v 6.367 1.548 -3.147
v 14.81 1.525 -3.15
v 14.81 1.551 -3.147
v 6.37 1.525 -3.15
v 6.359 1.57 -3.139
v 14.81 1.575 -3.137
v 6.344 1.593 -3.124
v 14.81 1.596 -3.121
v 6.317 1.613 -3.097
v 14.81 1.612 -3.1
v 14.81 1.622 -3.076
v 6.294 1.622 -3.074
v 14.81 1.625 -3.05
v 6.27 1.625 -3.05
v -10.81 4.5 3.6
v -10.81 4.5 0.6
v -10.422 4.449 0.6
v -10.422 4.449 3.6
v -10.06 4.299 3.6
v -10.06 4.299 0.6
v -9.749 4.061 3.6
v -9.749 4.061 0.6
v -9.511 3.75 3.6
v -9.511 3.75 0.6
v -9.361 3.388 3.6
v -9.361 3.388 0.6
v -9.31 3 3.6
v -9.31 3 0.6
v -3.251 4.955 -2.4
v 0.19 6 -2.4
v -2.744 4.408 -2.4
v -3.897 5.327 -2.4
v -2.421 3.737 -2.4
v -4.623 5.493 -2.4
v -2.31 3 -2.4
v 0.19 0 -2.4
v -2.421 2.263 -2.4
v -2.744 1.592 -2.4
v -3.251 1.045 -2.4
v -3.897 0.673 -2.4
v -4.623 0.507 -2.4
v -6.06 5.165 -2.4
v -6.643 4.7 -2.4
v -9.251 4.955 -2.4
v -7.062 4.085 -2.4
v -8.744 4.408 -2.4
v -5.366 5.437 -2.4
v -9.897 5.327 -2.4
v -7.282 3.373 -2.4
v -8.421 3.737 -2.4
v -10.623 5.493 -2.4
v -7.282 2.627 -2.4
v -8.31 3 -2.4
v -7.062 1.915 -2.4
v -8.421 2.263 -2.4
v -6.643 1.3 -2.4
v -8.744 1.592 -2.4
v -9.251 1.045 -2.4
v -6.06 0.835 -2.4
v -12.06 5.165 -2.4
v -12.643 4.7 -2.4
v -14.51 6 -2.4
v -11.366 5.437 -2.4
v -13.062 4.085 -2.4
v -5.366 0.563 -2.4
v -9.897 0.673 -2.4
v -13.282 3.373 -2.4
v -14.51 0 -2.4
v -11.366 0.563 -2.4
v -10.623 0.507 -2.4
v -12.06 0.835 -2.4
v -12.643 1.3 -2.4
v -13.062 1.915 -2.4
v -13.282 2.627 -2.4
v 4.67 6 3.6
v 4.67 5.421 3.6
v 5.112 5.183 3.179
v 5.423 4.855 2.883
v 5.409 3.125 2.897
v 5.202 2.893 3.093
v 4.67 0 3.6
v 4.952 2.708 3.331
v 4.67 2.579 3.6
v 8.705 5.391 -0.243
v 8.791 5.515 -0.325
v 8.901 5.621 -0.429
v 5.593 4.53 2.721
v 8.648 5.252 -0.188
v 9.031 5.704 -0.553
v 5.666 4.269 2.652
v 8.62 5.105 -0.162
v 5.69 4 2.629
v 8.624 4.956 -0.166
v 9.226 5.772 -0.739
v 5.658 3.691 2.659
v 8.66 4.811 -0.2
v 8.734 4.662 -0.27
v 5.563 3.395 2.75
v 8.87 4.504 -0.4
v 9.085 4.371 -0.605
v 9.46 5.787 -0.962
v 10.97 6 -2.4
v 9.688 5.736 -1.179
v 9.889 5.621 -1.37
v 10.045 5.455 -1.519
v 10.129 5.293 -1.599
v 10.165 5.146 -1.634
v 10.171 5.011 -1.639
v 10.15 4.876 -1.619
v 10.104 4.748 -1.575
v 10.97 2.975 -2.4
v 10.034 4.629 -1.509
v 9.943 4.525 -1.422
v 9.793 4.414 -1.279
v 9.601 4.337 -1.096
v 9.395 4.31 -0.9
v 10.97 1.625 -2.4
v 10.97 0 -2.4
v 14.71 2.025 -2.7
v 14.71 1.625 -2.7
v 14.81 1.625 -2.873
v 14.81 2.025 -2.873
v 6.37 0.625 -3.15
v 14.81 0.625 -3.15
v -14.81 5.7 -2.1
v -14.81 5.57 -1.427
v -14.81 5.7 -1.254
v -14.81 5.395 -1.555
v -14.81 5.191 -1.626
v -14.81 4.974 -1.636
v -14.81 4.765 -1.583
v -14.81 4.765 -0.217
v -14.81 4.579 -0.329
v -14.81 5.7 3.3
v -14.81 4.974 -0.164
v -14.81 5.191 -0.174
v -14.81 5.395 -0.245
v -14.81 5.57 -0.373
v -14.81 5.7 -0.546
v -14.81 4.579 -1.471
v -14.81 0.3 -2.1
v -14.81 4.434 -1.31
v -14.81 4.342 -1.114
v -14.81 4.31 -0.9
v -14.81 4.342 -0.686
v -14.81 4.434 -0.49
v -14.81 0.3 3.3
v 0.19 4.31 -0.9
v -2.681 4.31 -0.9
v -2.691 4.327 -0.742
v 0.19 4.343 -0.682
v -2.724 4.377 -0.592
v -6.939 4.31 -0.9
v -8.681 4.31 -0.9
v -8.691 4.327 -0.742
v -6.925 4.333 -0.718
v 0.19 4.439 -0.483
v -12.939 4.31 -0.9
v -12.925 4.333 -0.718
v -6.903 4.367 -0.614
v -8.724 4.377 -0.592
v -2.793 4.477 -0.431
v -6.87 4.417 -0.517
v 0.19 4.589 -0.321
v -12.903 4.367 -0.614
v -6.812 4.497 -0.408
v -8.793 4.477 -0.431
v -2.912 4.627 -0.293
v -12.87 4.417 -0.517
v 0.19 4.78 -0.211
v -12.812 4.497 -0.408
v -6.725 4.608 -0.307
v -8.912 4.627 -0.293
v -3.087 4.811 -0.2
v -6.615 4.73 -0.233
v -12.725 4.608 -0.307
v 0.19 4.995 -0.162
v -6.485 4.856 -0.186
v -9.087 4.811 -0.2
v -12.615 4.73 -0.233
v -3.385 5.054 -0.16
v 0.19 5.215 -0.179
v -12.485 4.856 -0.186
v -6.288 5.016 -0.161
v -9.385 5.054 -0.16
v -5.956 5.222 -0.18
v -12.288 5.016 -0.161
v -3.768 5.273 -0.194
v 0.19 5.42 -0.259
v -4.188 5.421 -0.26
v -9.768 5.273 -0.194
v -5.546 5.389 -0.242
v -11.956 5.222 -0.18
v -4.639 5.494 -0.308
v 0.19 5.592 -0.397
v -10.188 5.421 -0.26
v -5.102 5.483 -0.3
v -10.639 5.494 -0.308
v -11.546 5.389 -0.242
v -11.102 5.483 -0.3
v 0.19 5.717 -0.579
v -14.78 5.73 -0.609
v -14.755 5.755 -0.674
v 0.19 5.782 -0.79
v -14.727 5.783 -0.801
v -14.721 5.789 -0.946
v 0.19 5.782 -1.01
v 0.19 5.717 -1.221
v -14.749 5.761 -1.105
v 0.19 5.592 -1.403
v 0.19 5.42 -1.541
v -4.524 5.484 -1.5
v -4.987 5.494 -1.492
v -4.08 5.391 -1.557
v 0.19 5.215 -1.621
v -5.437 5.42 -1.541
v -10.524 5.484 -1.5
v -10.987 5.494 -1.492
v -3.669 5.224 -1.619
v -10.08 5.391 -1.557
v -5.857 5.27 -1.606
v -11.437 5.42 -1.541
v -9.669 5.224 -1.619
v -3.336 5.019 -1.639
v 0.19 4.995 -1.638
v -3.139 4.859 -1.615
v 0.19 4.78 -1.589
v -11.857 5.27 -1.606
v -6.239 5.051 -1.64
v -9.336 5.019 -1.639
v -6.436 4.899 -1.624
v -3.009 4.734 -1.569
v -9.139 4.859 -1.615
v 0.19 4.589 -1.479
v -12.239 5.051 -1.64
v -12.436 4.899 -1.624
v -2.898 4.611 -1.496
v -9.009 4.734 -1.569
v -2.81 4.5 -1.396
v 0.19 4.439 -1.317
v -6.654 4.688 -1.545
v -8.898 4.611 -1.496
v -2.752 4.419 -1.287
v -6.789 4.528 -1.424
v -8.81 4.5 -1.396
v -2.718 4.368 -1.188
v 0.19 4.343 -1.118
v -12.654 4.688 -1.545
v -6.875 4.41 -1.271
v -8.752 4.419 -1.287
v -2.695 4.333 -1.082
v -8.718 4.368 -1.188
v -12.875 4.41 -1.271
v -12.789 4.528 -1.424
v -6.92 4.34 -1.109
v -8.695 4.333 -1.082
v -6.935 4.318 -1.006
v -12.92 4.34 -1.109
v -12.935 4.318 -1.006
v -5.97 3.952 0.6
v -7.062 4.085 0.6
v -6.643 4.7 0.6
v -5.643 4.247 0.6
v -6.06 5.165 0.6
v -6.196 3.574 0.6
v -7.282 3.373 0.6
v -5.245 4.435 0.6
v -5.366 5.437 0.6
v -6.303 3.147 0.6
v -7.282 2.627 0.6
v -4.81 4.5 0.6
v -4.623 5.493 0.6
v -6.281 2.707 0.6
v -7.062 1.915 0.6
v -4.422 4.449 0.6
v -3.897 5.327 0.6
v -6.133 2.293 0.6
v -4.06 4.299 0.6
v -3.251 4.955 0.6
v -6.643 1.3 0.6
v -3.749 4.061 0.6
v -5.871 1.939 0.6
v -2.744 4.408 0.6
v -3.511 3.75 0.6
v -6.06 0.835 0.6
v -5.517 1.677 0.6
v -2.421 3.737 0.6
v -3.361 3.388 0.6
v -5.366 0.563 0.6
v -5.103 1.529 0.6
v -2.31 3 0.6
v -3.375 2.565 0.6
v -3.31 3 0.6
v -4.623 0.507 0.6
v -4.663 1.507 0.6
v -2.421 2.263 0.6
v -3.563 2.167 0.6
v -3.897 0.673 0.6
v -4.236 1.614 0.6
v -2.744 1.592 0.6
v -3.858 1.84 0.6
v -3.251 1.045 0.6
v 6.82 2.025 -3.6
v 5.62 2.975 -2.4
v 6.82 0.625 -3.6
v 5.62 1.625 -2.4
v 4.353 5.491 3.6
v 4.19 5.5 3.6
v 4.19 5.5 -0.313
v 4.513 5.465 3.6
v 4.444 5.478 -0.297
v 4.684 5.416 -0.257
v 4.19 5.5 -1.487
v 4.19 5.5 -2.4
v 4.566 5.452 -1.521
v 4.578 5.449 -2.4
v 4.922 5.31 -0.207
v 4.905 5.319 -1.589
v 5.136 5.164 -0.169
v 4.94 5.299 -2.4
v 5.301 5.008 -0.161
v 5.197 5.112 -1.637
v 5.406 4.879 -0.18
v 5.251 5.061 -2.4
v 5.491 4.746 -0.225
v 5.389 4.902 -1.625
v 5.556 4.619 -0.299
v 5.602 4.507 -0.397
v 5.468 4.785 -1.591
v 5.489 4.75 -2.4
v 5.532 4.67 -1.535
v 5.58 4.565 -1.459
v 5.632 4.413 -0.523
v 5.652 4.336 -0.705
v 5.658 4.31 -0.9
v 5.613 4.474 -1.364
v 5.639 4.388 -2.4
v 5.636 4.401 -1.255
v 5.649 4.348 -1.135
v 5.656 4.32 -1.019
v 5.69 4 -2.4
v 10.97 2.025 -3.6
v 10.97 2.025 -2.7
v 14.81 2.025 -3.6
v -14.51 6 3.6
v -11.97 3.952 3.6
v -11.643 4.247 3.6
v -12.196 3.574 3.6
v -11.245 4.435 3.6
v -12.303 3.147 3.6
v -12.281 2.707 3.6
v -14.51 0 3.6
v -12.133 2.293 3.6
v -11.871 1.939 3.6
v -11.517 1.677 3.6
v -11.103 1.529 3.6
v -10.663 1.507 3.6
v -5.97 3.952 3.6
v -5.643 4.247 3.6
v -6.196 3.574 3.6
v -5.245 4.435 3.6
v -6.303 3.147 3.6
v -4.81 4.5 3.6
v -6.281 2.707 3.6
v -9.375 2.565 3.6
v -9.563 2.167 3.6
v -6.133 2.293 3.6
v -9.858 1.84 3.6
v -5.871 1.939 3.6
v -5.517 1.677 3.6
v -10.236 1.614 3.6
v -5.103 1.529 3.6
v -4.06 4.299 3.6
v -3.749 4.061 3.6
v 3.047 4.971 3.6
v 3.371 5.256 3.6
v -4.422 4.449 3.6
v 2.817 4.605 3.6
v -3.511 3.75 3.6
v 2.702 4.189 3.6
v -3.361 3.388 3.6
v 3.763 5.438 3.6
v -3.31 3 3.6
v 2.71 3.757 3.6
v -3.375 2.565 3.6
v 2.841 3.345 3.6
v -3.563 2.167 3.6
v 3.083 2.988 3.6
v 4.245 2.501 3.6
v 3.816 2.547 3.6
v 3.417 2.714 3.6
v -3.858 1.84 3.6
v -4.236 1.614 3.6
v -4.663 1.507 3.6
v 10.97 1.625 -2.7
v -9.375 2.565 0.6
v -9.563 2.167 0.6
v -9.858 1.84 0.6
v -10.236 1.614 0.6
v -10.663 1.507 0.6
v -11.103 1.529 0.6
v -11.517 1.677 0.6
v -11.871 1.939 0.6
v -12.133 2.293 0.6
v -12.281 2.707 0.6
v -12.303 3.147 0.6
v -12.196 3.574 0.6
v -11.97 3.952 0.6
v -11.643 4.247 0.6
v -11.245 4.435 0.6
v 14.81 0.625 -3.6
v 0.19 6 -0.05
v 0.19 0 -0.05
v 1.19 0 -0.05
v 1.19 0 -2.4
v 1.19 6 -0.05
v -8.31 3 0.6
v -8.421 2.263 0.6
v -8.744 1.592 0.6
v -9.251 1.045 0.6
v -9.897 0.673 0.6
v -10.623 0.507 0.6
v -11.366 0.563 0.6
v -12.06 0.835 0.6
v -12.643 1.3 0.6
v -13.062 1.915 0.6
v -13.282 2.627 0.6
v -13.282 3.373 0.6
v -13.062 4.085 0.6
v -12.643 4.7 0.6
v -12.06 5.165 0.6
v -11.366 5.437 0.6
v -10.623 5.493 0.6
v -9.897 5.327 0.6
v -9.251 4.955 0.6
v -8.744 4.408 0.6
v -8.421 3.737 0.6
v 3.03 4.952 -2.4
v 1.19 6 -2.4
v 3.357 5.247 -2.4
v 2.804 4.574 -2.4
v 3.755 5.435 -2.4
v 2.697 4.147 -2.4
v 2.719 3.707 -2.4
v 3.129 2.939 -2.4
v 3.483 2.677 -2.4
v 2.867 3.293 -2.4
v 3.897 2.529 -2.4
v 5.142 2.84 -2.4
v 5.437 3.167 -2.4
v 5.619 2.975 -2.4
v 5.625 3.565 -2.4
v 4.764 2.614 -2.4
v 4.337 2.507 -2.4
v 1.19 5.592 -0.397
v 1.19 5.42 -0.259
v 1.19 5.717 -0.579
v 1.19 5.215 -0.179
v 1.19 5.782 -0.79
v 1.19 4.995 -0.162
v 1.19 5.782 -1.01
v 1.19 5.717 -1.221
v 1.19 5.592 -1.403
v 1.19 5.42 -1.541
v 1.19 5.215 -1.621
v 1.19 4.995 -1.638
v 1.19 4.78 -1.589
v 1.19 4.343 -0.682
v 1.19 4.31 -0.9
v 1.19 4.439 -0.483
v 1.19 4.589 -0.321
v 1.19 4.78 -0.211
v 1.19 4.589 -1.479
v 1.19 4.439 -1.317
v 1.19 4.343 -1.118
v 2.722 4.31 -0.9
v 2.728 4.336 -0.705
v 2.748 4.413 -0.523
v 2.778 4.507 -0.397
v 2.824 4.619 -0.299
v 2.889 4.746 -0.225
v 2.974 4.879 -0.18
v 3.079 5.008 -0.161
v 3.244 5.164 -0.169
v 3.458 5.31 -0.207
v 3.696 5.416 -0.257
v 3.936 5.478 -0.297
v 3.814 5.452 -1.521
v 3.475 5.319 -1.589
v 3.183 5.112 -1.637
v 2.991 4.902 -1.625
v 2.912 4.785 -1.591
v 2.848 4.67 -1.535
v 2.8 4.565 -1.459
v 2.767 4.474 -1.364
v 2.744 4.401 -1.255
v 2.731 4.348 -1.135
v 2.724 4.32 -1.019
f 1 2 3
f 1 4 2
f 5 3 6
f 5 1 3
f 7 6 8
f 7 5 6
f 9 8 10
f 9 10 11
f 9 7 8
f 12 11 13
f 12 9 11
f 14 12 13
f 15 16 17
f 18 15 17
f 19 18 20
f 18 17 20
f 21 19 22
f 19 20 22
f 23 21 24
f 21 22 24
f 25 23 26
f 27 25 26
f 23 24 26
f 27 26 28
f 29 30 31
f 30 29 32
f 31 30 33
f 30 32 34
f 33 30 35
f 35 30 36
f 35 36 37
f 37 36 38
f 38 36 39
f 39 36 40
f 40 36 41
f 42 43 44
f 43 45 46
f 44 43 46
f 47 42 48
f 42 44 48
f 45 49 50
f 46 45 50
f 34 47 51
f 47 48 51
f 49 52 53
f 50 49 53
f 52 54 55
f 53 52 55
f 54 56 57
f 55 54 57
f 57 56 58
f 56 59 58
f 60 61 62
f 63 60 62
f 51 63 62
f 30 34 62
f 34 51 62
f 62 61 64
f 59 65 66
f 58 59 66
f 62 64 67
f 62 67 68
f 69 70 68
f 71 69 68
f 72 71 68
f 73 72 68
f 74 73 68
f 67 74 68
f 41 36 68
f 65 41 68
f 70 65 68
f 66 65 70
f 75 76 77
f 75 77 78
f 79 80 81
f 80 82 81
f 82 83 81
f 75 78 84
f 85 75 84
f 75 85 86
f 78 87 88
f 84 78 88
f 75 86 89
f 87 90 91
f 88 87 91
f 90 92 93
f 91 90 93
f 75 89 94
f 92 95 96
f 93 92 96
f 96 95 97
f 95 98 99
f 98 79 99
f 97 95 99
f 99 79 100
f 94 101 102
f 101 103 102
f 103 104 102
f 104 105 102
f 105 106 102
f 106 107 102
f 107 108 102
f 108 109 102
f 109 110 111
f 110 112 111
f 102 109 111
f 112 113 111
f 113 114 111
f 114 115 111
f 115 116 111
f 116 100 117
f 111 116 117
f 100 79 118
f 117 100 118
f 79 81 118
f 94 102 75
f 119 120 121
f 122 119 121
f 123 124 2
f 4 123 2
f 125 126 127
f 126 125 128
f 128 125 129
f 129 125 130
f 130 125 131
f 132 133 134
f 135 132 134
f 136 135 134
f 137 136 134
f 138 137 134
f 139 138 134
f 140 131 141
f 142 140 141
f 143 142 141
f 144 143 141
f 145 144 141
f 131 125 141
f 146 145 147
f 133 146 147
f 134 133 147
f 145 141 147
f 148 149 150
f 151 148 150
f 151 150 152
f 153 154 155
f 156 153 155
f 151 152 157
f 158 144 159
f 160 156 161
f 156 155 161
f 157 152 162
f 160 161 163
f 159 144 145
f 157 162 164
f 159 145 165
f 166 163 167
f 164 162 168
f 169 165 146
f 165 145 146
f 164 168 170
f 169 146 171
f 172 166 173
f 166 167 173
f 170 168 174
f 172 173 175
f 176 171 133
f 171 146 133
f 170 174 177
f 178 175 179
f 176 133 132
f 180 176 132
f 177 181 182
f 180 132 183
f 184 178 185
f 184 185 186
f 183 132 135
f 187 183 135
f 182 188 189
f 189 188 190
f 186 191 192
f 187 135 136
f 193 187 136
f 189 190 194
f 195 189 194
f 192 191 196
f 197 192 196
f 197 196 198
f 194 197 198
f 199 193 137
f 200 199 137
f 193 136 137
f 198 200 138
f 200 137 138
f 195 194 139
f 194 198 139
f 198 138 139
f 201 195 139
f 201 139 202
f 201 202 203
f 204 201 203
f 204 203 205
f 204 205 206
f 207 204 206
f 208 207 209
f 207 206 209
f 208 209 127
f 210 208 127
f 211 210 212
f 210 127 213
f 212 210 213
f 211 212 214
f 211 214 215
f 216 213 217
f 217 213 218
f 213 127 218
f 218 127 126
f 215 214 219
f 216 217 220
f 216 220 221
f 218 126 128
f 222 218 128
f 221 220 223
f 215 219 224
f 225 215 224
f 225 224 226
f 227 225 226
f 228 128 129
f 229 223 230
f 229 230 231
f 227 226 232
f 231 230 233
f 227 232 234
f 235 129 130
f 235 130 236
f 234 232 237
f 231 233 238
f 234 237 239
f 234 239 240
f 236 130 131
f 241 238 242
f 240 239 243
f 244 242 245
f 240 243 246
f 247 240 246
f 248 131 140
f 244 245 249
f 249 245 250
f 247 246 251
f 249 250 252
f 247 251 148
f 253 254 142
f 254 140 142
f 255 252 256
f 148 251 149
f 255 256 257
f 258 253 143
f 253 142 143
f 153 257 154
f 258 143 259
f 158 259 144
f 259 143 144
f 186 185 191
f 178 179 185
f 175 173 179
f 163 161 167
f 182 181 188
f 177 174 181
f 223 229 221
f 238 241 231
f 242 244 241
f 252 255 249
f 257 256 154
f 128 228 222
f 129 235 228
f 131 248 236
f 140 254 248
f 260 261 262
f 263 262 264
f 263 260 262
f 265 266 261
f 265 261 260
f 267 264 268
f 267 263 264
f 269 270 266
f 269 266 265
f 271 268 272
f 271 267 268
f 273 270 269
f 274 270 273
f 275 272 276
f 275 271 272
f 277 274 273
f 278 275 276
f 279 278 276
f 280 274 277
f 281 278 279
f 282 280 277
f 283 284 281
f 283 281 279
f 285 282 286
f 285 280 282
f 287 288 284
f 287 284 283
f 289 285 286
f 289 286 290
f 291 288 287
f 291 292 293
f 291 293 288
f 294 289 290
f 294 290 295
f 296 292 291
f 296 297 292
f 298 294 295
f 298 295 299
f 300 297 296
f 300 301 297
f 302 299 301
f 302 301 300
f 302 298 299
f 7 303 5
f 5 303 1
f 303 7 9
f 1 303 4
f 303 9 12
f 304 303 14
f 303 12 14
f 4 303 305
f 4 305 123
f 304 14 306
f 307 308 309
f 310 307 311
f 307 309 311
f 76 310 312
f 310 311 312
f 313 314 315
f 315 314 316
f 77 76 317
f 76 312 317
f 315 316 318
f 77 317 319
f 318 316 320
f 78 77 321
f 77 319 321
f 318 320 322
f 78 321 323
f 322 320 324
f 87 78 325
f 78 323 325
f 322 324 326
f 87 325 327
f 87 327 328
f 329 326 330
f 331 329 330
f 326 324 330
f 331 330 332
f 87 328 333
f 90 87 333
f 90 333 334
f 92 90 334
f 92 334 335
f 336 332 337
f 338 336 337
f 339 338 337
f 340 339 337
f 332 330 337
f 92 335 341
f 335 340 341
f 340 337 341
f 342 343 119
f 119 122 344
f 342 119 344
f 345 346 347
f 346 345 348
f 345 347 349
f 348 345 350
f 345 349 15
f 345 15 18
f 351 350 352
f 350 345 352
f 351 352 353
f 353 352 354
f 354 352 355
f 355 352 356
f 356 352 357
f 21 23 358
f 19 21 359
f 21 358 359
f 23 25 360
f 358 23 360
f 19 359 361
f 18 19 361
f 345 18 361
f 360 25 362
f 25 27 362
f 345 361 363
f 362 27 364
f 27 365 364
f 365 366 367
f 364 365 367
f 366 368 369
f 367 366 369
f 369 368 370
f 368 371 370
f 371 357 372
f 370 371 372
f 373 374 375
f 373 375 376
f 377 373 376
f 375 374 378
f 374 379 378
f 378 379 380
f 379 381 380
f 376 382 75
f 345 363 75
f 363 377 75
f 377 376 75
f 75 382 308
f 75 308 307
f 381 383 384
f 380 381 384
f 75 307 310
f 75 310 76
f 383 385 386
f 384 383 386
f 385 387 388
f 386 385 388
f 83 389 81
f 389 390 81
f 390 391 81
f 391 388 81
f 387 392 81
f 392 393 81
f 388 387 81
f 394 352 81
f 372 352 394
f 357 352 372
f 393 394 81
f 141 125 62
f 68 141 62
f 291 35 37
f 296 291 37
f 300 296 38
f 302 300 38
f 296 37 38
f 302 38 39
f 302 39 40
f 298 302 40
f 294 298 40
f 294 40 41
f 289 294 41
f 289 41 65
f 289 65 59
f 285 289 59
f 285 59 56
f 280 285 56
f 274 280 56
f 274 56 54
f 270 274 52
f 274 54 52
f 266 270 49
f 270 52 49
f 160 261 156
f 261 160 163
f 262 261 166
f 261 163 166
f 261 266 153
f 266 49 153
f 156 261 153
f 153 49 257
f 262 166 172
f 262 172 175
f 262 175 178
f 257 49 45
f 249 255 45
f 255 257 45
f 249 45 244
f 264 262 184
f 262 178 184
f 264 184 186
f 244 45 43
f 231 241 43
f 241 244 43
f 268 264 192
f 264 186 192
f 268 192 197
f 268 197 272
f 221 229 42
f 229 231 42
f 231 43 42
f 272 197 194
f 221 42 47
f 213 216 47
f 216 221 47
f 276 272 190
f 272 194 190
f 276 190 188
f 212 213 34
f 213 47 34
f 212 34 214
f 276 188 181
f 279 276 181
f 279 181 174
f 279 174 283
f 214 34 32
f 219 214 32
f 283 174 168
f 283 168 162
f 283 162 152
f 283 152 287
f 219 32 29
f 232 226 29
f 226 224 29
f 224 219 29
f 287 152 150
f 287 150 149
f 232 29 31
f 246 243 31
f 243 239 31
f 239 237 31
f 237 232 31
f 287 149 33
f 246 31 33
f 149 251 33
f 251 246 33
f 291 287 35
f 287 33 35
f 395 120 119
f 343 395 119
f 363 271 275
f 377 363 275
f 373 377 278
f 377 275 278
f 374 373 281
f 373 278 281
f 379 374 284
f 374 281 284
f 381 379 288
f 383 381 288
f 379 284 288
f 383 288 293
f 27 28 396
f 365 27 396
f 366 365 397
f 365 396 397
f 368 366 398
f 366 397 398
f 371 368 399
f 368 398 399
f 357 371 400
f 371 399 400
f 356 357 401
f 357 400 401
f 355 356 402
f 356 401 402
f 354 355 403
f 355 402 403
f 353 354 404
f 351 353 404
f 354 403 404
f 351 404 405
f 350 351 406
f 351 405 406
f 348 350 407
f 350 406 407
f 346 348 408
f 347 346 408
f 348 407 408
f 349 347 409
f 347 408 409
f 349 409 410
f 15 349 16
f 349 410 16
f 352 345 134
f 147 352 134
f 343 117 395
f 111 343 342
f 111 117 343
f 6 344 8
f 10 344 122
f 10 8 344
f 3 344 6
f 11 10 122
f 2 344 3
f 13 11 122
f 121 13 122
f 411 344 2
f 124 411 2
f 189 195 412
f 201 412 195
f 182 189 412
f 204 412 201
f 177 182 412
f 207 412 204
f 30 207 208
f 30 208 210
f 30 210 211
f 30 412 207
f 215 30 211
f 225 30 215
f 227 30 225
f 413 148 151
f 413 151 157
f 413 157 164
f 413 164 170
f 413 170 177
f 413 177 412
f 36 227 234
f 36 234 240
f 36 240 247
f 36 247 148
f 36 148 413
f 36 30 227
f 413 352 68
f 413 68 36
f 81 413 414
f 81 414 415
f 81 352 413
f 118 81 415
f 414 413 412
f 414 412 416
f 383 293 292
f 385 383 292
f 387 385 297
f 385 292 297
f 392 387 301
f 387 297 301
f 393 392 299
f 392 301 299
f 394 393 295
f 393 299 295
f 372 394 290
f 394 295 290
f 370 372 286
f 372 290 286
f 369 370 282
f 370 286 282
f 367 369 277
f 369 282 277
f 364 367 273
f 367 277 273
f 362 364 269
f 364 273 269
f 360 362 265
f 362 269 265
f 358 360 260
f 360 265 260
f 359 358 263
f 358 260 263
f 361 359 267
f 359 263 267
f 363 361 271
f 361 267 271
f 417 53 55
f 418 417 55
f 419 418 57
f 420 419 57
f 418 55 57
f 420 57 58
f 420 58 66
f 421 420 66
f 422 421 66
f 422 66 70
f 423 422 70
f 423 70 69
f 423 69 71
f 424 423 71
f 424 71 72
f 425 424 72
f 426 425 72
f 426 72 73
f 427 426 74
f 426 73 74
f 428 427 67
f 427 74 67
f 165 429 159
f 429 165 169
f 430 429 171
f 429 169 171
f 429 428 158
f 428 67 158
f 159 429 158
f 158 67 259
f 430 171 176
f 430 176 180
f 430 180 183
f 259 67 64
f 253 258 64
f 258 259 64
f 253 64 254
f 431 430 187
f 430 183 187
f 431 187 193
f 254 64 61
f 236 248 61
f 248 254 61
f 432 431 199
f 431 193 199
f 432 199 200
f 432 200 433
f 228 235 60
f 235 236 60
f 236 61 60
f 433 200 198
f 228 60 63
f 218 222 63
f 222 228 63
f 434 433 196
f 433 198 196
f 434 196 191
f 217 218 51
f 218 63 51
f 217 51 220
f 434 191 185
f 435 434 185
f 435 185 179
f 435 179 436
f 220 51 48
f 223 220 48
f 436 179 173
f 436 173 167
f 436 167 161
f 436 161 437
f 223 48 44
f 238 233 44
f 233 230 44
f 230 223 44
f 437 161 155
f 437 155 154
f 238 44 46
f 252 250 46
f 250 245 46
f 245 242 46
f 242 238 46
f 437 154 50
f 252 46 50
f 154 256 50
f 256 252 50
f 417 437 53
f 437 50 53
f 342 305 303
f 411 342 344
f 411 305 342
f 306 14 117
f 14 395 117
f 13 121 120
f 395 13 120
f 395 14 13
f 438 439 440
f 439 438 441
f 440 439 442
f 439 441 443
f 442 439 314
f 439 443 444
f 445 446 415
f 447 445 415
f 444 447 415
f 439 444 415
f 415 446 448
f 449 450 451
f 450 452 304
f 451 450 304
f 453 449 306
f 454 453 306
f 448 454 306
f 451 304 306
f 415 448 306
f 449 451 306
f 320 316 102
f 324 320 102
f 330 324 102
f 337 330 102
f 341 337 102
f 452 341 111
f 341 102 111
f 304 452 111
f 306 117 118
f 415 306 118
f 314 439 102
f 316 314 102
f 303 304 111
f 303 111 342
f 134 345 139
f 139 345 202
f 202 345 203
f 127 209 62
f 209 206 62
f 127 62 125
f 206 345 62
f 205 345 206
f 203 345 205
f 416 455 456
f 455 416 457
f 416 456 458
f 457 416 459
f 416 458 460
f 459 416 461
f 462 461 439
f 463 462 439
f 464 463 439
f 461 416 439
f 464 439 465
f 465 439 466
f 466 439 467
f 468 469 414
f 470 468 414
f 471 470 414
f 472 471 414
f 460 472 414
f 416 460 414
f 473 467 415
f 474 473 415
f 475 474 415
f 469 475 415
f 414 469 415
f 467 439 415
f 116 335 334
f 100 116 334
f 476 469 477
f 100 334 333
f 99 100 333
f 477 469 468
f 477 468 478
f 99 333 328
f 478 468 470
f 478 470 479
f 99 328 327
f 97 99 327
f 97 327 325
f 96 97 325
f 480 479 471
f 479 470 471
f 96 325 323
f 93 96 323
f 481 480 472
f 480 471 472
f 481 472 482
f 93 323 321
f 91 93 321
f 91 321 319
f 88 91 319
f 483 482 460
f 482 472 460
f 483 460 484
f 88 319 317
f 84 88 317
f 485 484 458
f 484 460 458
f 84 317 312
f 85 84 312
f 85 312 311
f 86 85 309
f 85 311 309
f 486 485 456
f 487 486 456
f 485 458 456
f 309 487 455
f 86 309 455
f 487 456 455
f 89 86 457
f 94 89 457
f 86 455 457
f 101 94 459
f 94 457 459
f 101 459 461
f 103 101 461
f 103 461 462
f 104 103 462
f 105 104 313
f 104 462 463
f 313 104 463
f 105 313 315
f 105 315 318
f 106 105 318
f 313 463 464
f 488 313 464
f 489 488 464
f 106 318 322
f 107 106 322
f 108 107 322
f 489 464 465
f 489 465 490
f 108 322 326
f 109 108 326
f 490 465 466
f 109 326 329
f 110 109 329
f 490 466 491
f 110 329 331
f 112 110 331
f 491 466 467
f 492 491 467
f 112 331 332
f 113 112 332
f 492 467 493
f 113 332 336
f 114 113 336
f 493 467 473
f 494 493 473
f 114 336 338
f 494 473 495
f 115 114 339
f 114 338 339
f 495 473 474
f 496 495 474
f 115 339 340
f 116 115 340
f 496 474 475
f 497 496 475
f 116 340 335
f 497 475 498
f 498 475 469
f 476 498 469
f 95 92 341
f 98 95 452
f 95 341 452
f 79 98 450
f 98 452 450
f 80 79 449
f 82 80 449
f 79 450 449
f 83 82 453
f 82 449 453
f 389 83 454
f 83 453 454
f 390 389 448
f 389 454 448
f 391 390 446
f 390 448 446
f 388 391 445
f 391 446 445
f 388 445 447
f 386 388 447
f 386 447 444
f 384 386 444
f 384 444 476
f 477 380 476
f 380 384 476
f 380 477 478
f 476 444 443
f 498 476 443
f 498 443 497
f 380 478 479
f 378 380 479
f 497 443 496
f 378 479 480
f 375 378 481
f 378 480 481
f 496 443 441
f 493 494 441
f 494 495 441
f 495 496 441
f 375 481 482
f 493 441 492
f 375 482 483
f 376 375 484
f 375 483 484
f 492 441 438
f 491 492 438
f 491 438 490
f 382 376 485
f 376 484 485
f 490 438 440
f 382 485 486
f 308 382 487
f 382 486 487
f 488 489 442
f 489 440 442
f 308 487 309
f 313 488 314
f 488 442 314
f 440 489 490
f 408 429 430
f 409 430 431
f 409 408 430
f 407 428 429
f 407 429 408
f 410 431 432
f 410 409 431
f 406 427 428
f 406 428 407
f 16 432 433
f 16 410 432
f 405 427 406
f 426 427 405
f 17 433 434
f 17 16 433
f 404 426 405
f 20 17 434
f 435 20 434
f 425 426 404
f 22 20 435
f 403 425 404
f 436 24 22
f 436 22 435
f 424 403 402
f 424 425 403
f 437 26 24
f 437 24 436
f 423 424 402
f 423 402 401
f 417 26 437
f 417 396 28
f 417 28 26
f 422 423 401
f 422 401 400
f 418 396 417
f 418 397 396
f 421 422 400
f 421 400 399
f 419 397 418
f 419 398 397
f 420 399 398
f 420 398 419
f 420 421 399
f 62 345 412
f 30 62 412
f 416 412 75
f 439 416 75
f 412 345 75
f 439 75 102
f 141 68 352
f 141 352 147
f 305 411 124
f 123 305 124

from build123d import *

# Parameters (mm, degrees)
F0_W         = 29.62
F0_H         = 7.2
F1_DEPTH     = 6
F3_DEPTH     = 6
F5_DEPTH     = 6
F6_W         = 1
F6_H         = 6
F7_DEPTH     = 2.35
F8_W         = 3.025
F8_H         = 1.2
F9_DEPTH     = 9.191
F11_DEPTH    = 9.191
F12_W        = 0.625
F12_H        = 0.45
F13_DEPTH    = 9.191
F14_R        = 0.1
F16_DEPTH    = 3.84
F18_DEPTH    = 0.4
F20_DEPTH    = 6
F21_R        = 2.5
F22_DEPTH    = 3
F24_DEPTH    = 29.621
F25_T1_DEPTH = 7.5430097928
F25_T3_DEPTH = 7.5430097928
F27_DEPTH    = 6


# Not quite as in the source:
# - a fillet or chamfer that OpenCascade refuses, or shapes differently, is made with other operations: its cross-section is extruded or revolved along the edge and cut away or added


with BuildPart() as f1:
    # F0 (on Front) → F1 (new body)
    with BuildSketch(Plane.XZ):
        Rectangle(F0_W, F0_H)
    extrude(amount=-F1_DEPTH)

    # F2 (on face) → F3 (cut, through all)
    with BuildSketch(Plane.XZ):
        Polygon((10.97, -2.4), (14.81, -2.4), (14.81, 3.6), (4.67, 3.6), align=None)
    extrude(amount=-F3_DEPTH, mode=Mode.SUBTRACT)

    # F4 (on face) → F5 (cut, through all)
    with BuildSketch(Plane.XZ):
        Polygon((6.82, -3.6), (5.62, -2.4), (-14.81, -2.4), (-14.81, -3.6), align=None)
    extrude(amount=-F5_DEPTH, mode=Mode.SUBTRACT)

    # F6 (on face) → F7 (cut)
    with BuildSketch(Plane(origin=(0, 0, -2.4), x_dir=(1, 0, 0), z_dir=(0, 0, -1))):
        with Locations((0.69, -3)):
            Rectangle(F6_W, F6_H)
    extrude(amount=-F7_DEPTH, mode=Mode.SUBTRACT)

    # F8 (on face) → F9 (cut, through all)
    with BuildSketch(Plane.YZ.offset(14.81)):
        with Locations((4.4875, -3)):
            Rectangle(F8_W, F8_H)
    extrude(amount=-F9_DEPTH, mode=Mode.SUBTRACT)

    # F10 (on face) → F11 (cut, through all)
    with BuildSketch(Plane.YZ.offset(14.81)):
        Polygon((2.025, -3.6), (2.975, -3.6), (2.975, -2.4), align=None)
    extrude(amount=-F11_DEPTH, mode=Mode.SUBTRACT)

    # F12 (on face) → F13 (cut, through all)
    with BuildSketch(Plane.YZ.offset(14.81)):
        with Locations((0.3125, -3.375)):
            Rectangle(F12_W, F12_H)
        Polygon((0, -3.15), (0.625, -3.15), (1.625, -3.15), (1.625, -2.4), (0, -2.4), align=None)
    extrude(amount=-F13_DEPTH, mode=Mode.SUBTRACT)

    # F14
    f14_edges = [f1.edges().sort_by_distance(p)[0] for p in [
        (10.59, 1.625, -3.15),
    ]]
    fillet(f14_edges, radius=F14_R)

    # F15 (on face) → F16 (cut)
    with BuildSketch(Plane.YZ.offset(14.81)):
        Polygon((2.025, -2.7), (2.025, -3.6), (2.975, -2.4), (1.625, -2.4), (1.625, -2.7), align=None)
    extrude(amount=-F16_DEPTH, mode=Mode.SUBTRACT)

    # F17 (on face) → F18 (cut, through all)
    with BuildSketch(Plane.XZ.offset(-1.625)):
        Polygon((14.81, -2.8732050808), (14.81, -2.7), (14.71, -2.7), align=None)
    extrude(amount=-F18_DEPTH, mode=Mode.SUBTRACT)

    # F19 (on face) → F20 (cut, through all)
    with BuildSketch(Plane(origin=(0, 0, -2.4), x_dir=(1, 0, 0), z_dir=(0, 0, -1))):
        with BuildLine():
            ThreePointArc((-3.31, -3), (-5.8706601718, -1.9393398282), (-4.81, -4.5))
            ThreePointArc((-4.81, -4.5), (-3.7493398282, -4.0606601718), (-3.31, -3))
        make_face()
        with BuildLine():
            ThreePointArc((-9.31, -3), (-11.8706601718, -1.9393398282), (-10.81, -4.5))
            ThreePointArc((-10.81, -4.5), (-9.7493398282, -4.0606601718), (-9.31, -3))
        make_face()
    extrude(amount=-F20_DEPTH, mode=Mode.SUBTRACT)

    # F21 (on face) → F22 (cut)
    with BuildSketch(Plane(origin=(0, 0, -2.4), x_dir=(1, 0, 0), z_dir=(0, 0, -1))):
        with Locations((-10.81, -3)):
            Circle(F21_R)
        with Locations((-4.81, -3)):
            Circle(F21_R)
    extrude(amount=-F22_DEPTH, mode=Mode.SUBTRACT)

    # F23 (on face) → F24 (cut, through all)
    with BuildSketch(Plane(origin=(-14.81, 0, 0), x_dir=(0, -1, 0), z_dir=(-1, 0, 0))):
        with BuildLine():
            ThreePointArc((-5.79, -0.9), (-5.05, -1.64), (-4.31, -0.9))
            ThreePointArc((-4.31, -0.9), (-5.05, -0.16), (-5.79, -0.9))
        make_face()
    extrude(amount=-F24_DEPTH, mode=Mode.SUBTRACT)

    # F25: chamfer of 0.3 on 4 edges, made by hand

    # F25_s2 → F25_t1 (cut)
    with BuildSketch(Plane.XY.offset(-3.1715048964)):
        Polygon((-14.51, 0), (-14.81, 0.3), (-14.81, 0), align=None)
        Polygon((-14.51, 6), (-14.81, 5.7), (-14.81, 6), align=None)
    extrude(amount=F25_T1_DEPTH, mode=Mode.SUBTRACT)

    # F25_s4 → F25_t3 (cut)
    with BuildSketch(Plane.XZ.offset(-6.7715048964)):
        Polygon((-14.51, 3.6), (-14.81, 3.3), (-14.81, 3.6), align=None)
        Polygon((-14.81, -2.1), (-14.51, -2.4), (-14.81, -2.4), align=None)
    extrude(amount=F25_T3_DEPTH, mode=Mode.SUBTRACT)

    # F26 (on face) → F27 (cut, through all)
    with BuildSketch(Plane(origin=(0, 0, -2.4), x_dir=(1, 0, 0), z_dir=(0, 0, -1))):
        with BuildLine():
            ThreePointArc((4.19, -5.5), (5.2506601718, -5.0606601718), (5.69, -4))
            ThreePointArc((5.69, -4), (3.1293398282, -2.9393398282), (4.19, -5.5))
        make_face()
    extrude(amount=-F27_DEPTH, mode=Mode.SUBTRACT)


solid = f1.part
